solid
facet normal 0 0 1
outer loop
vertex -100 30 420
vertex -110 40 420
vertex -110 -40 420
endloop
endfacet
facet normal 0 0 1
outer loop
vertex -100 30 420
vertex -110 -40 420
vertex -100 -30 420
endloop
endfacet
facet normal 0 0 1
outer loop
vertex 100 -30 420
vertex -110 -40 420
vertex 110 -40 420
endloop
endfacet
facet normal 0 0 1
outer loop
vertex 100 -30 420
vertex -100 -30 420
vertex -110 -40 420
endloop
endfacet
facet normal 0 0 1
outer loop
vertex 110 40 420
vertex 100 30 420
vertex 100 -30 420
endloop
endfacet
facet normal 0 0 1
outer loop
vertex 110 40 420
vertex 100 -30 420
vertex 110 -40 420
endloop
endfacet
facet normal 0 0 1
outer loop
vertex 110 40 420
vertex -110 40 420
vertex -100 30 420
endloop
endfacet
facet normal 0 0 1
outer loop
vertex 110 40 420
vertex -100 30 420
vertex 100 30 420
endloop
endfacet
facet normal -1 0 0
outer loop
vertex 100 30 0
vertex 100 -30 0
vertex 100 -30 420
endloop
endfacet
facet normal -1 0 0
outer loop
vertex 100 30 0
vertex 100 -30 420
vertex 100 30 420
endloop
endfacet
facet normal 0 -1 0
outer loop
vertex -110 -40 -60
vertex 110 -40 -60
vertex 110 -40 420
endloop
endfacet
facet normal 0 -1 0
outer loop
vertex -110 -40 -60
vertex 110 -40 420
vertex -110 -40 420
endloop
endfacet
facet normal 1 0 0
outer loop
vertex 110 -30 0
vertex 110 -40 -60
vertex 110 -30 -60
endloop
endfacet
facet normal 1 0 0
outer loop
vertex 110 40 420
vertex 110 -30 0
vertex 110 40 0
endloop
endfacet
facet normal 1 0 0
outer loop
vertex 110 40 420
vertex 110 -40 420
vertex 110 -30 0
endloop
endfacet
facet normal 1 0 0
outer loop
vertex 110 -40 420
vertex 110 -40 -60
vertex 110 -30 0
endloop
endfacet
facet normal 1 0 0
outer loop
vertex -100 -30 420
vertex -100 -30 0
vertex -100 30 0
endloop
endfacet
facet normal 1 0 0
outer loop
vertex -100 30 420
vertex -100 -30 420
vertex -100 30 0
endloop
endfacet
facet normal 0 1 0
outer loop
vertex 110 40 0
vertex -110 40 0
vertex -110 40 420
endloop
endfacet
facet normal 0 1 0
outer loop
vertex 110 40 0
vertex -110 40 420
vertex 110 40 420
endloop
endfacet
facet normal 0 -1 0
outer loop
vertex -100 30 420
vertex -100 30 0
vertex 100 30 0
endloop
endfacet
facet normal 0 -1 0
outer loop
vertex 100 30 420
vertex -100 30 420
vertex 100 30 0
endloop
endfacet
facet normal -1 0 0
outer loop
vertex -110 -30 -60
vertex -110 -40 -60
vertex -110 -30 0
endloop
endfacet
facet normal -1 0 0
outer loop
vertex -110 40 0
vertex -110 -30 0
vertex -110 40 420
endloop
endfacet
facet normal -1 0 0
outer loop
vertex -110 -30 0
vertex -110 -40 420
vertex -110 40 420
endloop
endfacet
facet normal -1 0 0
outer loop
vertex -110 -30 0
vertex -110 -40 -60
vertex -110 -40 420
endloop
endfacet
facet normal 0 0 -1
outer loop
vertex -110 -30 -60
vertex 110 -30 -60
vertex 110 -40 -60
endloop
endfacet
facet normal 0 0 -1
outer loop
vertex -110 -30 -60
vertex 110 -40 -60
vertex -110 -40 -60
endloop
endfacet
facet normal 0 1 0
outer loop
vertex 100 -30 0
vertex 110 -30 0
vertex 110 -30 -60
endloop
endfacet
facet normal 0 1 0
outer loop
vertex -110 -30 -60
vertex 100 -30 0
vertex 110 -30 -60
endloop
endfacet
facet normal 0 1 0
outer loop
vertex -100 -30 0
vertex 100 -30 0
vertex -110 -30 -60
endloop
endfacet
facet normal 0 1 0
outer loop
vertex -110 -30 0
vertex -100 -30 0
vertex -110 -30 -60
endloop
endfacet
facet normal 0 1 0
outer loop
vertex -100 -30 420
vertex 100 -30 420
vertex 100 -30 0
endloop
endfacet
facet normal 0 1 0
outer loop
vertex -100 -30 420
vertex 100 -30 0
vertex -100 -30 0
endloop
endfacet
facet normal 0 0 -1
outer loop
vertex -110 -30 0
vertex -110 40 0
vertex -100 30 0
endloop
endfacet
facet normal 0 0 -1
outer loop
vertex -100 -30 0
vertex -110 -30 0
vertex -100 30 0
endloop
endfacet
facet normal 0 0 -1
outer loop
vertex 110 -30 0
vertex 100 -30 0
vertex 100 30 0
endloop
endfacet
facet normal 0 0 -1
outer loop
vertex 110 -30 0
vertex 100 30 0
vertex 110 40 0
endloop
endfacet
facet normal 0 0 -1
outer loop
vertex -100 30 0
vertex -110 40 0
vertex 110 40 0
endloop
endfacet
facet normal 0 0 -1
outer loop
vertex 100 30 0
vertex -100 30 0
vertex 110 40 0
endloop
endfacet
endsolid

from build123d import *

# Parameters (mm, degrees)
SKETCH1_W           = 220
SKETCH1_H           = 80
SKETCH1_W_2         = 200
SKETCH1_H_2         = 60
BOSS_EXTRUDE1_DEPTH = 420
SKETCH3_W           = 220
SKETCH3_H           = 10
BOSS_EXTRUDE3_DEPTH = 60


with BuildPart() as part:
    # Sketch1 → Boss-Extrude1 (new body)
    with BuildSketch(Plane.XY):
        Rectangle(SKETCH1_W, SKETCH1_H)
        Rectangle(SKETCH1_W_2, SKETCH1_H_2, mode=Mode.SUBTRACT)
    extrude(amount=BOSS_EXTRUDE1_DEPTH)

    # Sketch3 → Boss-Extrude3 (add)
    with BuildSketch(Plane(origin=(0, 0, 0), x_dir=(-1, 0, 0), z_dir=(0, 0, -1))):
        with Locations((0, -35)):
            Rectangle(SKETCH3_W, SKETCH3_H)
    extrude(amount=BOSS_EXTRUDE3_DEPTH)


solid = part.part
